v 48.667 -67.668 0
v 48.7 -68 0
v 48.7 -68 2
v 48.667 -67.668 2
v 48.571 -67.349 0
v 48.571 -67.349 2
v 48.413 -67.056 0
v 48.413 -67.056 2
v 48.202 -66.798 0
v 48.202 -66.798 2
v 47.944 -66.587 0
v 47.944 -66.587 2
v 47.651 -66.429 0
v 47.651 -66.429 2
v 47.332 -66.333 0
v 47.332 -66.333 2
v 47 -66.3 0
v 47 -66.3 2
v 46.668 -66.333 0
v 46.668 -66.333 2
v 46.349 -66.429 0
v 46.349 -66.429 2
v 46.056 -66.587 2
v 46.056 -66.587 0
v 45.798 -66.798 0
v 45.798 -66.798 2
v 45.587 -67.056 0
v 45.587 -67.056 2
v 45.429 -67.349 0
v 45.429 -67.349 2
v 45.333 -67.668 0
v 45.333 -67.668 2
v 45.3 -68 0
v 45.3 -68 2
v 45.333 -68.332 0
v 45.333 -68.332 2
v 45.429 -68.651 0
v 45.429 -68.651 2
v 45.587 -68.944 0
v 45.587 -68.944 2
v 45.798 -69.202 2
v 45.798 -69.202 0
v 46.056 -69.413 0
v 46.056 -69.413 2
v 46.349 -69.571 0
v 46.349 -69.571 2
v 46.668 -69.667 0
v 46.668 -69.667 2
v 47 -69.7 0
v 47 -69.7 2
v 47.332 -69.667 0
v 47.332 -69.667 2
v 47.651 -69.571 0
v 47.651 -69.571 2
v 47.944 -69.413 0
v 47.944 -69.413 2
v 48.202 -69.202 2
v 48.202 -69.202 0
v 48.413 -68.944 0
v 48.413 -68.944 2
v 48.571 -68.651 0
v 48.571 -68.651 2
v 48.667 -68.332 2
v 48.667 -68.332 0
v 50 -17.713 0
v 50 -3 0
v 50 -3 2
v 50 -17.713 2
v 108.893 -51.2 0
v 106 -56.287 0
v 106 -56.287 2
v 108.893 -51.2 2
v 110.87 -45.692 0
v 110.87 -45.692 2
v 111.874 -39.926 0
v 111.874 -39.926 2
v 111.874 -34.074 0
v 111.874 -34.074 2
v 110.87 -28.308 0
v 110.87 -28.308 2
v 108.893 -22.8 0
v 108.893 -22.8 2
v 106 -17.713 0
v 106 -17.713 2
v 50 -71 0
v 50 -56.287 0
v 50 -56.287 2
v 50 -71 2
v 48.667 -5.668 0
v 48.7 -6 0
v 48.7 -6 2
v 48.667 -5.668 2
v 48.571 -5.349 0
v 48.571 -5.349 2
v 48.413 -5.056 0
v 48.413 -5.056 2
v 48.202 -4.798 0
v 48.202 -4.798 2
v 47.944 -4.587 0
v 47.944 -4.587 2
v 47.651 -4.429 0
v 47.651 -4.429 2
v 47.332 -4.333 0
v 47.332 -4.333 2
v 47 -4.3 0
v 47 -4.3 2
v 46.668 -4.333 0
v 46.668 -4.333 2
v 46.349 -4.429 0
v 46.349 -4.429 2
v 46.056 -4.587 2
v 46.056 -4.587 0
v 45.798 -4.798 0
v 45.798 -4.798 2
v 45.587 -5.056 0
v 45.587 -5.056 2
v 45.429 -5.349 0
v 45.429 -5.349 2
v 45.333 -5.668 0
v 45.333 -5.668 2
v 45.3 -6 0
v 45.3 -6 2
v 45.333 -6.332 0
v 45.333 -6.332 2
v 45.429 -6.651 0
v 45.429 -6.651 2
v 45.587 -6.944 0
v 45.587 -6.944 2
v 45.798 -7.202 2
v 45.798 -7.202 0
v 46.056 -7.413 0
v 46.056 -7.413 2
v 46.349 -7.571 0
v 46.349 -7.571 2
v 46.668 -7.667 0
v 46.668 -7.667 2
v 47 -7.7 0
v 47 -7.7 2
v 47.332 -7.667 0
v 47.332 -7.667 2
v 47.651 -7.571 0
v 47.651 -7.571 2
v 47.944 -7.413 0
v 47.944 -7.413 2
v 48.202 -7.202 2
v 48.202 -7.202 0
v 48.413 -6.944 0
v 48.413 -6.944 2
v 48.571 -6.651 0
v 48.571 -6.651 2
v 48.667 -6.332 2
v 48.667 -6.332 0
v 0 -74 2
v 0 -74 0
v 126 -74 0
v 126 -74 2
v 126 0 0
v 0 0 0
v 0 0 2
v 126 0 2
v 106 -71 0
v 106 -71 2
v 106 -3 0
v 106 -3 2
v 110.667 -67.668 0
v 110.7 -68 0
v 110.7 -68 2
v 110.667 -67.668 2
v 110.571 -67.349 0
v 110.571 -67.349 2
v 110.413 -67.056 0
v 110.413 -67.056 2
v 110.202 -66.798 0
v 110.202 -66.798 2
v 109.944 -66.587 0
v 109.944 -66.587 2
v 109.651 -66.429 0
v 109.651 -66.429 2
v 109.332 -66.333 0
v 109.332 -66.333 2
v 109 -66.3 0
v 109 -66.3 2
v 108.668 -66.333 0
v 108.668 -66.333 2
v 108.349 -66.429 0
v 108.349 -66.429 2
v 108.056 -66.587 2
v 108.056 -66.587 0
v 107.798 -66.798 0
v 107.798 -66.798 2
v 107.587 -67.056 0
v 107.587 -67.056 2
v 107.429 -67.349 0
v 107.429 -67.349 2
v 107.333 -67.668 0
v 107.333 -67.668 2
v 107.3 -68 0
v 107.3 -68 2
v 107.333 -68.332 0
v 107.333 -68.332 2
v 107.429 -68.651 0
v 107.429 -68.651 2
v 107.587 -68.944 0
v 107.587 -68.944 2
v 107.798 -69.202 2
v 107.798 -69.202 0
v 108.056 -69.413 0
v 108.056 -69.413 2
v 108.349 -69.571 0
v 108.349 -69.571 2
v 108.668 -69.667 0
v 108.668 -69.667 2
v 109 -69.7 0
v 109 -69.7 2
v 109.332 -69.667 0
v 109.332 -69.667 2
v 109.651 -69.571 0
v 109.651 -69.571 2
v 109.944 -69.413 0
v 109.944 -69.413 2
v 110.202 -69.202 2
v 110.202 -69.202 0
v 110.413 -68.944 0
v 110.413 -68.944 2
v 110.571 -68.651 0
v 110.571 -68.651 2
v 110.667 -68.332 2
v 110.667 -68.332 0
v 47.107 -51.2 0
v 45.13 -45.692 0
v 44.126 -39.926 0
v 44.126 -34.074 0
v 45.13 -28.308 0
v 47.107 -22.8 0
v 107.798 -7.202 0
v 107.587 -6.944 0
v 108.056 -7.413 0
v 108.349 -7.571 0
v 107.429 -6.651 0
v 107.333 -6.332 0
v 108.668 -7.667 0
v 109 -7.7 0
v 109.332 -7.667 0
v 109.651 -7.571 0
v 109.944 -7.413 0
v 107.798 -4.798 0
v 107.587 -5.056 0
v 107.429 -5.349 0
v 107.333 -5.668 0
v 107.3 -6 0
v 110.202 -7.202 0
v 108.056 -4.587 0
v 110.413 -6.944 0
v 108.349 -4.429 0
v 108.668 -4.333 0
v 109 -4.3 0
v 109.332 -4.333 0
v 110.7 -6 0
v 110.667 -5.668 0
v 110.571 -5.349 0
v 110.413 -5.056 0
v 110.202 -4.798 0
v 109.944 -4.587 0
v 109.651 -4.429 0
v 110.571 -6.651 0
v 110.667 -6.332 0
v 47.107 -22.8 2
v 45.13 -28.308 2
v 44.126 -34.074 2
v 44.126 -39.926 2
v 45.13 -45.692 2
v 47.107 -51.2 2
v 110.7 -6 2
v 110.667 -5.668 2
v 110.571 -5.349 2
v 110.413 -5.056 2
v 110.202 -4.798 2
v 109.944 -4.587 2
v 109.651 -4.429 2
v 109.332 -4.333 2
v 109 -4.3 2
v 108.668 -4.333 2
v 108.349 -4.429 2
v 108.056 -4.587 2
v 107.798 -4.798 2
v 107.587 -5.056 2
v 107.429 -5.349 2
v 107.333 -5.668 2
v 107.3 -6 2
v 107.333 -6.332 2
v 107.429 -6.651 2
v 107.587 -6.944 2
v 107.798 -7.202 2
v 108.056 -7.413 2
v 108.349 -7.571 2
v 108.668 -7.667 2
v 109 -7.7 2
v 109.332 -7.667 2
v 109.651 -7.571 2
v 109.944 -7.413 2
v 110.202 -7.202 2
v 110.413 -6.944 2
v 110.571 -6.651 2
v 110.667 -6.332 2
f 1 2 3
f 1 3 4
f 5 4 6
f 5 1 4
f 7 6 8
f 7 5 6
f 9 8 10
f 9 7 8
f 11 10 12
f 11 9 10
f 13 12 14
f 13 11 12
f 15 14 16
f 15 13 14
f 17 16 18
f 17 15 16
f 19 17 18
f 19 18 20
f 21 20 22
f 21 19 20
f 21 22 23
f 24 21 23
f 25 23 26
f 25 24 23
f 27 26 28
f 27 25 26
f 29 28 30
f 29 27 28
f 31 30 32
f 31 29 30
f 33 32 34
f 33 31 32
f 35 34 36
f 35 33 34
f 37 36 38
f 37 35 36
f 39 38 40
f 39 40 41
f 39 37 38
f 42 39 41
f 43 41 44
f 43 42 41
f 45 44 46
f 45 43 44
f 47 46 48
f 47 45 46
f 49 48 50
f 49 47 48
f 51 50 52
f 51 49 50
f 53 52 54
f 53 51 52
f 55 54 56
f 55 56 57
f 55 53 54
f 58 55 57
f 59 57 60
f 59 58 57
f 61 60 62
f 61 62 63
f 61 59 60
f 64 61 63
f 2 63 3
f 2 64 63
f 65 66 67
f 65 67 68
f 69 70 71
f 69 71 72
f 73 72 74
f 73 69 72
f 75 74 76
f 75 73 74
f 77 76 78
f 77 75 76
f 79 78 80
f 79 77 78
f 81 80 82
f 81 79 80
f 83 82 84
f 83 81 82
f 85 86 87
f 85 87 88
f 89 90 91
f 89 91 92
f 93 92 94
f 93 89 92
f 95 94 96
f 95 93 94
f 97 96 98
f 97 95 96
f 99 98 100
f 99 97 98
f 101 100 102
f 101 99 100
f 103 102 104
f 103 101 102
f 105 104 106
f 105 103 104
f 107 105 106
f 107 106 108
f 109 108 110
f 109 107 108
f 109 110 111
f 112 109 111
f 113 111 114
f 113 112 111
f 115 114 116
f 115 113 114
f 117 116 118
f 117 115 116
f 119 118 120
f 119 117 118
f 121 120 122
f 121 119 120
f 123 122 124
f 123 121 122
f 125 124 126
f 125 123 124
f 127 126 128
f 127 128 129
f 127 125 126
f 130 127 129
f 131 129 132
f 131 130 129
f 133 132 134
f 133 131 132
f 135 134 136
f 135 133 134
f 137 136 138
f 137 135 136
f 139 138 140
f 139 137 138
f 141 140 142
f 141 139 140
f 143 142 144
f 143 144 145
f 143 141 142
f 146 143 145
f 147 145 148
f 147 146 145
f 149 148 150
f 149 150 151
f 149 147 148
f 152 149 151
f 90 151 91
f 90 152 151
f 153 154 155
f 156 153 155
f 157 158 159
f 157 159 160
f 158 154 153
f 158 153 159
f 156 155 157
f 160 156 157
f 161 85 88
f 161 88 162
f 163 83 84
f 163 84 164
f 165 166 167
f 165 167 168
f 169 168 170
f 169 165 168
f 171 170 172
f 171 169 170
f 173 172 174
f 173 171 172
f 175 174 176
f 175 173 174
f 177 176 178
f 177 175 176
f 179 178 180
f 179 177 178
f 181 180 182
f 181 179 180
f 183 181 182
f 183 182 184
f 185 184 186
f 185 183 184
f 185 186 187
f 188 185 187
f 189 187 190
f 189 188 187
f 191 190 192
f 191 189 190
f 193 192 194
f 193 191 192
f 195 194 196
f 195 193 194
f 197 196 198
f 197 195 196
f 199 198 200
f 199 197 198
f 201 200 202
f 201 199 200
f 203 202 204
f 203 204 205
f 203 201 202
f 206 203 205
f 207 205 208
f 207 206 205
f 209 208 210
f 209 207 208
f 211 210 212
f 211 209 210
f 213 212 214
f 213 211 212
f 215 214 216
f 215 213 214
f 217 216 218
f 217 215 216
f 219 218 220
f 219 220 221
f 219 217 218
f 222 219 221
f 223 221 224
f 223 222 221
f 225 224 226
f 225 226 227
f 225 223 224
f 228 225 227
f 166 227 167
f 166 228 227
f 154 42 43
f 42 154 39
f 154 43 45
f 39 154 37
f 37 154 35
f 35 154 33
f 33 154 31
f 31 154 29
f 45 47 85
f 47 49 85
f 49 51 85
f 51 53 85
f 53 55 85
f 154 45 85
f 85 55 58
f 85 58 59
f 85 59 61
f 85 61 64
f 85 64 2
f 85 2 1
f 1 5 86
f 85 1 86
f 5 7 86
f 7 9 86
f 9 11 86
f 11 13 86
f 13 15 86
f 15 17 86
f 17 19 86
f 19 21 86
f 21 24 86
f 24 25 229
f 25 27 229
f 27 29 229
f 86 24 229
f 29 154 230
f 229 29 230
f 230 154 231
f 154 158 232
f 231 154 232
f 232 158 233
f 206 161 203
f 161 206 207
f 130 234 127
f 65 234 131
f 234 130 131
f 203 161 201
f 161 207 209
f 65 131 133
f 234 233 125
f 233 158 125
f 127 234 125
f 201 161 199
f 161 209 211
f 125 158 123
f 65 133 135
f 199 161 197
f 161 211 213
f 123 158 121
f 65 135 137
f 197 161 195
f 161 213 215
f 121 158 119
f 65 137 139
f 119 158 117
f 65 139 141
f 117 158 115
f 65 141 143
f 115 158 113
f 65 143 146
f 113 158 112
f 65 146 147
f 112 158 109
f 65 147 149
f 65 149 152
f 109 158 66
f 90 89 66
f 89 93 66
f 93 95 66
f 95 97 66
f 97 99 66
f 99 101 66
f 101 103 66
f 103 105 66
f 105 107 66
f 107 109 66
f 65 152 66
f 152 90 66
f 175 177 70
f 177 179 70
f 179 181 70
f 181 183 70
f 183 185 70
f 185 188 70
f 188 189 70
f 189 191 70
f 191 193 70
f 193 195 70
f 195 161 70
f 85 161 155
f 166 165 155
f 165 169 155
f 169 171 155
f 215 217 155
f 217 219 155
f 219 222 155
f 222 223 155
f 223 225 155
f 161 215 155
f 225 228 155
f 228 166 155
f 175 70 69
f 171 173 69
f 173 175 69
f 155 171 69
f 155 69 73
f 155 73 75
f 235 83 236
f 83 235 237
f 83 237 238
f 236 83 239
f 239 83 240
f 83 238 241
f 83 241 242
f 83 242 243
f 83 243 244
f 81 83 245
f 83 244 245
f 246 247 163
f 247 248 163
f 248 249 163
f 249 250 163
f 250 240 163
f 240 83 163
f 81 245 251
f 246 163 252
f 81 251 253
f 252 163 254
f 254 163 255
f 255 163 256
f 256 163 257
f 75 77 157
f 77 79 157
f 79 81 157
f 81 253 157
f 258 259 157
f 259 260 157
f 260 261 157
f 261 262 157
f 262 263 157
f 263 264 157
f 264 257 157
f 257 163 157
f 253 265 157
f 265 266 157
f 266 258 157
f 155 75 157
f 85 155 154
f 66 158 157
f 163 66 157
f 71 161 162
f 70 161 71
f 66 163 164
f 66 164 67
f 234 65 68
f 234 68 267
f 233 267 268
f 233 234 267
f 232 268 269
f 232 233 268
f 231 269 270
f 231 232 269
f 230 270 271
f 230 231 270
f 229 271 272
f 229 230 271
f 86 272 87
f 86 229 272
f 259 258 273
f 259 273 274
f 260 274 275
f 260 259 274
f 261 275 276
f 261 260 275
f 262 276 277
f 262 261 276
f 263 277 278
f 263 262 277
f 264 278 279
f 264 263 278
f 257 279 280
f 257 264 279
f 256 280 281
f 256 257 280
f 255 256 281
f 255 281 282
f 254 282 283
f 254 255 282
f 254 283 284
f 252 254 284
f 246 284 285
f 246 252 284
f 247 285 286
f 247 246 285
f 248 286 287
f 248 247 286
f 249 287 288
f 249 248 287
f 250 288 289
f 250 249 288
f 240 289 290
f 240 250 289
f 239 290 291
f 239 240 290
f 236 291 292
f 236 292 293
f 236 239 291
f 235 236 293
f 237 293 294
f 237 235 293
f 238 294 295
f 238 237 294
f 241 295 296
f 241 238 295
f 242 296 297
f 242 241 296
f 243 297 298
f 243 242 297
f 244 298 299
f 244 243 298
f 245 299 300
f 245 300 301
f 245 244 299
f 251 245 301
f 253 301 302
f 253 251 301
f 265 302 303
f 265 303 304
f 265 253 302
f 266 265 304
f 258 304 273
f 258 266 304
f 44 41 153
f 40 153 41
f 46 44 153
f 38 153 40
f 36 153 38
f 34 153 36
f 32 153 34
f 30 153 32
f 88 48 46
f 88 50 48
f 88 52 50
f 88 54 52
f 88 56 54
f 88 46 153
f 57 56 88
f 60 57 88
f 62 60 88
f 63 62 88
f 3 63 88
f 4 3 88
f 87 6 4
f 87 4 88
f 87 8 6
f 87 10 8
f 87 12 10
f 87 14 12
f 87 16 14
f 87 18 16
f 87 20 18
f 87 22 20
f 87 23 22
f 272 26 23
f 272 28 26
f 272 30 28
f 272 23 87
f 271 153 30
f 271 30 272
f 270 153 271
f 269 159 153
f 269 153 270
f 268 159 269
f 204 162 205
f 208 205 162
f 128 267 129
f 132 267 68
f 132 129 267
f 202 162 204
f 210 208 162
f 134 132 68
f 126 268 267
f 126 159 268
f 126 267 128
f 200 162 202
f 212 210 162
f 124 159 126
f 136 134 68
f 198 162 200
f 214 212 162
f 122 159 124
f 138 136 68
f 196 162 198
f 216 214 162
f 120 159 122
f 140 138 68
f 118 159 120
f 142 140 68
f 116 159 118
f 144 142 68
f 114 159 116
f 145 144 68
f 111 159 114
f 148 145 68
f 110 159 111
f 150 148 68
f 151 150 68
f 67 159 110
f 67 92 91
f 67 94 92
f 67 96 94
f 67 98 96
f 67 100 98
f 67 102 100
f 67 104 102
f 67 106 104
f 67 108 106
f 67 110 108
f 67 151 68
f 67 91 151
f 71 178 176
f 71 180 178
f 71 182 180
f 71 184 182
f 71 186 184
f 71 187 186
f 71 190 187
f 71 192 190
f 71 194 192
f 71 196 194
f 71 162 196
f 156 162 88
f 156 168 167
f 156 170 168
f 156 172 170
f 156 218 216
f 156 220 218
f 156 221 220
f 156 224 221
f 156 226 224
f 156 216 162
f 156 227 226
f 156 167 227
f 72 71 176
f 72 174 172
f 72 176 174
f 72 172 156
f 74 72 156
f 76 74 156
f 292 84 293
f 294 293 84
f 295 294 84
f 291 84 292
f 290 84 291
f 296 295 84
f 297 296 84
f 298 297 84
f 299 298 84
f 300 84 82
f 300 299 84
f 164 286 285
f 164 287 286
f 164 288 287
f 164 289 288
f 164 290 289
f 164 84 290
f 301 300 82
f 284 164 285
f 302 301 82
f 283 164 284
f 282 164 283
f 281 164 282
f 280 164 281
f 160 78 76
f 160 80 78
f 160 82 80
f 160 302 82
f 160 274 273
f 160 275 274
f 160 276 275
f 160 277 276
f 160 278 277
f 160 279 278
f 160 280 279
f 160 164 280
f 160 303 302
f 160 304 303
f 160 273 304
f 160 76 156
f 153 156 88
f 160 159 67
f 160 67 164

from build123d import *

# Parameters (mm, degrees)
ESBO_O1_W                = 126
ESBO_O1_H                = 74
ESBO_O1_R                = 1.7
RESSALTO_EXTRUS_O1_DEPTH = 2


with BuildPart() as part:
    # Esboço1 → Ressalto-extrusão1 (new body)
    with BuildSketch(Plane.XY):
        with Locations((63, -37)):
            Rectangle(ESBO_O1_W, ESBO_O1_H)
        with Locations((47, -6)):
            Circle(ESBO_O1_R, mode=Mode.SUBTRACT)
        with Locations((109, -6)):
            Circle(ESBO_O1_R, mode=Mode.SUBTRACT)
        with Locations((47, -68)):
            Circle(ESBO_O1_R, mode=Mode.SUBTRACT)
        with Locations((109, -68)):
            Circle(ESBO_O1_R, mode=Mode.SUBTRACT)
        with BuildLine():
            Line((50, -3), (50, -17.712698478))
            ThreePointArc((50, -17.712698478), (44, -37), (50, -56.287301522))
            Line((50, -56.287301522), (50, -71))
            Line((50, -71), (106, -71))
            Line((106, -71), (106, -56.287301522))
            ThreePointArc((106, -56.287301522), (112, -37), (106, -17.712698478))
            Line((106, -17.712698478), (106, -3))
            Line((106, -3), (50, -3))
        make_face(mode=Mode.SUBTRACT)
    extrude(amount=RESSALTO_EXTRUS_O1_DEPTH)


solid = part.part
